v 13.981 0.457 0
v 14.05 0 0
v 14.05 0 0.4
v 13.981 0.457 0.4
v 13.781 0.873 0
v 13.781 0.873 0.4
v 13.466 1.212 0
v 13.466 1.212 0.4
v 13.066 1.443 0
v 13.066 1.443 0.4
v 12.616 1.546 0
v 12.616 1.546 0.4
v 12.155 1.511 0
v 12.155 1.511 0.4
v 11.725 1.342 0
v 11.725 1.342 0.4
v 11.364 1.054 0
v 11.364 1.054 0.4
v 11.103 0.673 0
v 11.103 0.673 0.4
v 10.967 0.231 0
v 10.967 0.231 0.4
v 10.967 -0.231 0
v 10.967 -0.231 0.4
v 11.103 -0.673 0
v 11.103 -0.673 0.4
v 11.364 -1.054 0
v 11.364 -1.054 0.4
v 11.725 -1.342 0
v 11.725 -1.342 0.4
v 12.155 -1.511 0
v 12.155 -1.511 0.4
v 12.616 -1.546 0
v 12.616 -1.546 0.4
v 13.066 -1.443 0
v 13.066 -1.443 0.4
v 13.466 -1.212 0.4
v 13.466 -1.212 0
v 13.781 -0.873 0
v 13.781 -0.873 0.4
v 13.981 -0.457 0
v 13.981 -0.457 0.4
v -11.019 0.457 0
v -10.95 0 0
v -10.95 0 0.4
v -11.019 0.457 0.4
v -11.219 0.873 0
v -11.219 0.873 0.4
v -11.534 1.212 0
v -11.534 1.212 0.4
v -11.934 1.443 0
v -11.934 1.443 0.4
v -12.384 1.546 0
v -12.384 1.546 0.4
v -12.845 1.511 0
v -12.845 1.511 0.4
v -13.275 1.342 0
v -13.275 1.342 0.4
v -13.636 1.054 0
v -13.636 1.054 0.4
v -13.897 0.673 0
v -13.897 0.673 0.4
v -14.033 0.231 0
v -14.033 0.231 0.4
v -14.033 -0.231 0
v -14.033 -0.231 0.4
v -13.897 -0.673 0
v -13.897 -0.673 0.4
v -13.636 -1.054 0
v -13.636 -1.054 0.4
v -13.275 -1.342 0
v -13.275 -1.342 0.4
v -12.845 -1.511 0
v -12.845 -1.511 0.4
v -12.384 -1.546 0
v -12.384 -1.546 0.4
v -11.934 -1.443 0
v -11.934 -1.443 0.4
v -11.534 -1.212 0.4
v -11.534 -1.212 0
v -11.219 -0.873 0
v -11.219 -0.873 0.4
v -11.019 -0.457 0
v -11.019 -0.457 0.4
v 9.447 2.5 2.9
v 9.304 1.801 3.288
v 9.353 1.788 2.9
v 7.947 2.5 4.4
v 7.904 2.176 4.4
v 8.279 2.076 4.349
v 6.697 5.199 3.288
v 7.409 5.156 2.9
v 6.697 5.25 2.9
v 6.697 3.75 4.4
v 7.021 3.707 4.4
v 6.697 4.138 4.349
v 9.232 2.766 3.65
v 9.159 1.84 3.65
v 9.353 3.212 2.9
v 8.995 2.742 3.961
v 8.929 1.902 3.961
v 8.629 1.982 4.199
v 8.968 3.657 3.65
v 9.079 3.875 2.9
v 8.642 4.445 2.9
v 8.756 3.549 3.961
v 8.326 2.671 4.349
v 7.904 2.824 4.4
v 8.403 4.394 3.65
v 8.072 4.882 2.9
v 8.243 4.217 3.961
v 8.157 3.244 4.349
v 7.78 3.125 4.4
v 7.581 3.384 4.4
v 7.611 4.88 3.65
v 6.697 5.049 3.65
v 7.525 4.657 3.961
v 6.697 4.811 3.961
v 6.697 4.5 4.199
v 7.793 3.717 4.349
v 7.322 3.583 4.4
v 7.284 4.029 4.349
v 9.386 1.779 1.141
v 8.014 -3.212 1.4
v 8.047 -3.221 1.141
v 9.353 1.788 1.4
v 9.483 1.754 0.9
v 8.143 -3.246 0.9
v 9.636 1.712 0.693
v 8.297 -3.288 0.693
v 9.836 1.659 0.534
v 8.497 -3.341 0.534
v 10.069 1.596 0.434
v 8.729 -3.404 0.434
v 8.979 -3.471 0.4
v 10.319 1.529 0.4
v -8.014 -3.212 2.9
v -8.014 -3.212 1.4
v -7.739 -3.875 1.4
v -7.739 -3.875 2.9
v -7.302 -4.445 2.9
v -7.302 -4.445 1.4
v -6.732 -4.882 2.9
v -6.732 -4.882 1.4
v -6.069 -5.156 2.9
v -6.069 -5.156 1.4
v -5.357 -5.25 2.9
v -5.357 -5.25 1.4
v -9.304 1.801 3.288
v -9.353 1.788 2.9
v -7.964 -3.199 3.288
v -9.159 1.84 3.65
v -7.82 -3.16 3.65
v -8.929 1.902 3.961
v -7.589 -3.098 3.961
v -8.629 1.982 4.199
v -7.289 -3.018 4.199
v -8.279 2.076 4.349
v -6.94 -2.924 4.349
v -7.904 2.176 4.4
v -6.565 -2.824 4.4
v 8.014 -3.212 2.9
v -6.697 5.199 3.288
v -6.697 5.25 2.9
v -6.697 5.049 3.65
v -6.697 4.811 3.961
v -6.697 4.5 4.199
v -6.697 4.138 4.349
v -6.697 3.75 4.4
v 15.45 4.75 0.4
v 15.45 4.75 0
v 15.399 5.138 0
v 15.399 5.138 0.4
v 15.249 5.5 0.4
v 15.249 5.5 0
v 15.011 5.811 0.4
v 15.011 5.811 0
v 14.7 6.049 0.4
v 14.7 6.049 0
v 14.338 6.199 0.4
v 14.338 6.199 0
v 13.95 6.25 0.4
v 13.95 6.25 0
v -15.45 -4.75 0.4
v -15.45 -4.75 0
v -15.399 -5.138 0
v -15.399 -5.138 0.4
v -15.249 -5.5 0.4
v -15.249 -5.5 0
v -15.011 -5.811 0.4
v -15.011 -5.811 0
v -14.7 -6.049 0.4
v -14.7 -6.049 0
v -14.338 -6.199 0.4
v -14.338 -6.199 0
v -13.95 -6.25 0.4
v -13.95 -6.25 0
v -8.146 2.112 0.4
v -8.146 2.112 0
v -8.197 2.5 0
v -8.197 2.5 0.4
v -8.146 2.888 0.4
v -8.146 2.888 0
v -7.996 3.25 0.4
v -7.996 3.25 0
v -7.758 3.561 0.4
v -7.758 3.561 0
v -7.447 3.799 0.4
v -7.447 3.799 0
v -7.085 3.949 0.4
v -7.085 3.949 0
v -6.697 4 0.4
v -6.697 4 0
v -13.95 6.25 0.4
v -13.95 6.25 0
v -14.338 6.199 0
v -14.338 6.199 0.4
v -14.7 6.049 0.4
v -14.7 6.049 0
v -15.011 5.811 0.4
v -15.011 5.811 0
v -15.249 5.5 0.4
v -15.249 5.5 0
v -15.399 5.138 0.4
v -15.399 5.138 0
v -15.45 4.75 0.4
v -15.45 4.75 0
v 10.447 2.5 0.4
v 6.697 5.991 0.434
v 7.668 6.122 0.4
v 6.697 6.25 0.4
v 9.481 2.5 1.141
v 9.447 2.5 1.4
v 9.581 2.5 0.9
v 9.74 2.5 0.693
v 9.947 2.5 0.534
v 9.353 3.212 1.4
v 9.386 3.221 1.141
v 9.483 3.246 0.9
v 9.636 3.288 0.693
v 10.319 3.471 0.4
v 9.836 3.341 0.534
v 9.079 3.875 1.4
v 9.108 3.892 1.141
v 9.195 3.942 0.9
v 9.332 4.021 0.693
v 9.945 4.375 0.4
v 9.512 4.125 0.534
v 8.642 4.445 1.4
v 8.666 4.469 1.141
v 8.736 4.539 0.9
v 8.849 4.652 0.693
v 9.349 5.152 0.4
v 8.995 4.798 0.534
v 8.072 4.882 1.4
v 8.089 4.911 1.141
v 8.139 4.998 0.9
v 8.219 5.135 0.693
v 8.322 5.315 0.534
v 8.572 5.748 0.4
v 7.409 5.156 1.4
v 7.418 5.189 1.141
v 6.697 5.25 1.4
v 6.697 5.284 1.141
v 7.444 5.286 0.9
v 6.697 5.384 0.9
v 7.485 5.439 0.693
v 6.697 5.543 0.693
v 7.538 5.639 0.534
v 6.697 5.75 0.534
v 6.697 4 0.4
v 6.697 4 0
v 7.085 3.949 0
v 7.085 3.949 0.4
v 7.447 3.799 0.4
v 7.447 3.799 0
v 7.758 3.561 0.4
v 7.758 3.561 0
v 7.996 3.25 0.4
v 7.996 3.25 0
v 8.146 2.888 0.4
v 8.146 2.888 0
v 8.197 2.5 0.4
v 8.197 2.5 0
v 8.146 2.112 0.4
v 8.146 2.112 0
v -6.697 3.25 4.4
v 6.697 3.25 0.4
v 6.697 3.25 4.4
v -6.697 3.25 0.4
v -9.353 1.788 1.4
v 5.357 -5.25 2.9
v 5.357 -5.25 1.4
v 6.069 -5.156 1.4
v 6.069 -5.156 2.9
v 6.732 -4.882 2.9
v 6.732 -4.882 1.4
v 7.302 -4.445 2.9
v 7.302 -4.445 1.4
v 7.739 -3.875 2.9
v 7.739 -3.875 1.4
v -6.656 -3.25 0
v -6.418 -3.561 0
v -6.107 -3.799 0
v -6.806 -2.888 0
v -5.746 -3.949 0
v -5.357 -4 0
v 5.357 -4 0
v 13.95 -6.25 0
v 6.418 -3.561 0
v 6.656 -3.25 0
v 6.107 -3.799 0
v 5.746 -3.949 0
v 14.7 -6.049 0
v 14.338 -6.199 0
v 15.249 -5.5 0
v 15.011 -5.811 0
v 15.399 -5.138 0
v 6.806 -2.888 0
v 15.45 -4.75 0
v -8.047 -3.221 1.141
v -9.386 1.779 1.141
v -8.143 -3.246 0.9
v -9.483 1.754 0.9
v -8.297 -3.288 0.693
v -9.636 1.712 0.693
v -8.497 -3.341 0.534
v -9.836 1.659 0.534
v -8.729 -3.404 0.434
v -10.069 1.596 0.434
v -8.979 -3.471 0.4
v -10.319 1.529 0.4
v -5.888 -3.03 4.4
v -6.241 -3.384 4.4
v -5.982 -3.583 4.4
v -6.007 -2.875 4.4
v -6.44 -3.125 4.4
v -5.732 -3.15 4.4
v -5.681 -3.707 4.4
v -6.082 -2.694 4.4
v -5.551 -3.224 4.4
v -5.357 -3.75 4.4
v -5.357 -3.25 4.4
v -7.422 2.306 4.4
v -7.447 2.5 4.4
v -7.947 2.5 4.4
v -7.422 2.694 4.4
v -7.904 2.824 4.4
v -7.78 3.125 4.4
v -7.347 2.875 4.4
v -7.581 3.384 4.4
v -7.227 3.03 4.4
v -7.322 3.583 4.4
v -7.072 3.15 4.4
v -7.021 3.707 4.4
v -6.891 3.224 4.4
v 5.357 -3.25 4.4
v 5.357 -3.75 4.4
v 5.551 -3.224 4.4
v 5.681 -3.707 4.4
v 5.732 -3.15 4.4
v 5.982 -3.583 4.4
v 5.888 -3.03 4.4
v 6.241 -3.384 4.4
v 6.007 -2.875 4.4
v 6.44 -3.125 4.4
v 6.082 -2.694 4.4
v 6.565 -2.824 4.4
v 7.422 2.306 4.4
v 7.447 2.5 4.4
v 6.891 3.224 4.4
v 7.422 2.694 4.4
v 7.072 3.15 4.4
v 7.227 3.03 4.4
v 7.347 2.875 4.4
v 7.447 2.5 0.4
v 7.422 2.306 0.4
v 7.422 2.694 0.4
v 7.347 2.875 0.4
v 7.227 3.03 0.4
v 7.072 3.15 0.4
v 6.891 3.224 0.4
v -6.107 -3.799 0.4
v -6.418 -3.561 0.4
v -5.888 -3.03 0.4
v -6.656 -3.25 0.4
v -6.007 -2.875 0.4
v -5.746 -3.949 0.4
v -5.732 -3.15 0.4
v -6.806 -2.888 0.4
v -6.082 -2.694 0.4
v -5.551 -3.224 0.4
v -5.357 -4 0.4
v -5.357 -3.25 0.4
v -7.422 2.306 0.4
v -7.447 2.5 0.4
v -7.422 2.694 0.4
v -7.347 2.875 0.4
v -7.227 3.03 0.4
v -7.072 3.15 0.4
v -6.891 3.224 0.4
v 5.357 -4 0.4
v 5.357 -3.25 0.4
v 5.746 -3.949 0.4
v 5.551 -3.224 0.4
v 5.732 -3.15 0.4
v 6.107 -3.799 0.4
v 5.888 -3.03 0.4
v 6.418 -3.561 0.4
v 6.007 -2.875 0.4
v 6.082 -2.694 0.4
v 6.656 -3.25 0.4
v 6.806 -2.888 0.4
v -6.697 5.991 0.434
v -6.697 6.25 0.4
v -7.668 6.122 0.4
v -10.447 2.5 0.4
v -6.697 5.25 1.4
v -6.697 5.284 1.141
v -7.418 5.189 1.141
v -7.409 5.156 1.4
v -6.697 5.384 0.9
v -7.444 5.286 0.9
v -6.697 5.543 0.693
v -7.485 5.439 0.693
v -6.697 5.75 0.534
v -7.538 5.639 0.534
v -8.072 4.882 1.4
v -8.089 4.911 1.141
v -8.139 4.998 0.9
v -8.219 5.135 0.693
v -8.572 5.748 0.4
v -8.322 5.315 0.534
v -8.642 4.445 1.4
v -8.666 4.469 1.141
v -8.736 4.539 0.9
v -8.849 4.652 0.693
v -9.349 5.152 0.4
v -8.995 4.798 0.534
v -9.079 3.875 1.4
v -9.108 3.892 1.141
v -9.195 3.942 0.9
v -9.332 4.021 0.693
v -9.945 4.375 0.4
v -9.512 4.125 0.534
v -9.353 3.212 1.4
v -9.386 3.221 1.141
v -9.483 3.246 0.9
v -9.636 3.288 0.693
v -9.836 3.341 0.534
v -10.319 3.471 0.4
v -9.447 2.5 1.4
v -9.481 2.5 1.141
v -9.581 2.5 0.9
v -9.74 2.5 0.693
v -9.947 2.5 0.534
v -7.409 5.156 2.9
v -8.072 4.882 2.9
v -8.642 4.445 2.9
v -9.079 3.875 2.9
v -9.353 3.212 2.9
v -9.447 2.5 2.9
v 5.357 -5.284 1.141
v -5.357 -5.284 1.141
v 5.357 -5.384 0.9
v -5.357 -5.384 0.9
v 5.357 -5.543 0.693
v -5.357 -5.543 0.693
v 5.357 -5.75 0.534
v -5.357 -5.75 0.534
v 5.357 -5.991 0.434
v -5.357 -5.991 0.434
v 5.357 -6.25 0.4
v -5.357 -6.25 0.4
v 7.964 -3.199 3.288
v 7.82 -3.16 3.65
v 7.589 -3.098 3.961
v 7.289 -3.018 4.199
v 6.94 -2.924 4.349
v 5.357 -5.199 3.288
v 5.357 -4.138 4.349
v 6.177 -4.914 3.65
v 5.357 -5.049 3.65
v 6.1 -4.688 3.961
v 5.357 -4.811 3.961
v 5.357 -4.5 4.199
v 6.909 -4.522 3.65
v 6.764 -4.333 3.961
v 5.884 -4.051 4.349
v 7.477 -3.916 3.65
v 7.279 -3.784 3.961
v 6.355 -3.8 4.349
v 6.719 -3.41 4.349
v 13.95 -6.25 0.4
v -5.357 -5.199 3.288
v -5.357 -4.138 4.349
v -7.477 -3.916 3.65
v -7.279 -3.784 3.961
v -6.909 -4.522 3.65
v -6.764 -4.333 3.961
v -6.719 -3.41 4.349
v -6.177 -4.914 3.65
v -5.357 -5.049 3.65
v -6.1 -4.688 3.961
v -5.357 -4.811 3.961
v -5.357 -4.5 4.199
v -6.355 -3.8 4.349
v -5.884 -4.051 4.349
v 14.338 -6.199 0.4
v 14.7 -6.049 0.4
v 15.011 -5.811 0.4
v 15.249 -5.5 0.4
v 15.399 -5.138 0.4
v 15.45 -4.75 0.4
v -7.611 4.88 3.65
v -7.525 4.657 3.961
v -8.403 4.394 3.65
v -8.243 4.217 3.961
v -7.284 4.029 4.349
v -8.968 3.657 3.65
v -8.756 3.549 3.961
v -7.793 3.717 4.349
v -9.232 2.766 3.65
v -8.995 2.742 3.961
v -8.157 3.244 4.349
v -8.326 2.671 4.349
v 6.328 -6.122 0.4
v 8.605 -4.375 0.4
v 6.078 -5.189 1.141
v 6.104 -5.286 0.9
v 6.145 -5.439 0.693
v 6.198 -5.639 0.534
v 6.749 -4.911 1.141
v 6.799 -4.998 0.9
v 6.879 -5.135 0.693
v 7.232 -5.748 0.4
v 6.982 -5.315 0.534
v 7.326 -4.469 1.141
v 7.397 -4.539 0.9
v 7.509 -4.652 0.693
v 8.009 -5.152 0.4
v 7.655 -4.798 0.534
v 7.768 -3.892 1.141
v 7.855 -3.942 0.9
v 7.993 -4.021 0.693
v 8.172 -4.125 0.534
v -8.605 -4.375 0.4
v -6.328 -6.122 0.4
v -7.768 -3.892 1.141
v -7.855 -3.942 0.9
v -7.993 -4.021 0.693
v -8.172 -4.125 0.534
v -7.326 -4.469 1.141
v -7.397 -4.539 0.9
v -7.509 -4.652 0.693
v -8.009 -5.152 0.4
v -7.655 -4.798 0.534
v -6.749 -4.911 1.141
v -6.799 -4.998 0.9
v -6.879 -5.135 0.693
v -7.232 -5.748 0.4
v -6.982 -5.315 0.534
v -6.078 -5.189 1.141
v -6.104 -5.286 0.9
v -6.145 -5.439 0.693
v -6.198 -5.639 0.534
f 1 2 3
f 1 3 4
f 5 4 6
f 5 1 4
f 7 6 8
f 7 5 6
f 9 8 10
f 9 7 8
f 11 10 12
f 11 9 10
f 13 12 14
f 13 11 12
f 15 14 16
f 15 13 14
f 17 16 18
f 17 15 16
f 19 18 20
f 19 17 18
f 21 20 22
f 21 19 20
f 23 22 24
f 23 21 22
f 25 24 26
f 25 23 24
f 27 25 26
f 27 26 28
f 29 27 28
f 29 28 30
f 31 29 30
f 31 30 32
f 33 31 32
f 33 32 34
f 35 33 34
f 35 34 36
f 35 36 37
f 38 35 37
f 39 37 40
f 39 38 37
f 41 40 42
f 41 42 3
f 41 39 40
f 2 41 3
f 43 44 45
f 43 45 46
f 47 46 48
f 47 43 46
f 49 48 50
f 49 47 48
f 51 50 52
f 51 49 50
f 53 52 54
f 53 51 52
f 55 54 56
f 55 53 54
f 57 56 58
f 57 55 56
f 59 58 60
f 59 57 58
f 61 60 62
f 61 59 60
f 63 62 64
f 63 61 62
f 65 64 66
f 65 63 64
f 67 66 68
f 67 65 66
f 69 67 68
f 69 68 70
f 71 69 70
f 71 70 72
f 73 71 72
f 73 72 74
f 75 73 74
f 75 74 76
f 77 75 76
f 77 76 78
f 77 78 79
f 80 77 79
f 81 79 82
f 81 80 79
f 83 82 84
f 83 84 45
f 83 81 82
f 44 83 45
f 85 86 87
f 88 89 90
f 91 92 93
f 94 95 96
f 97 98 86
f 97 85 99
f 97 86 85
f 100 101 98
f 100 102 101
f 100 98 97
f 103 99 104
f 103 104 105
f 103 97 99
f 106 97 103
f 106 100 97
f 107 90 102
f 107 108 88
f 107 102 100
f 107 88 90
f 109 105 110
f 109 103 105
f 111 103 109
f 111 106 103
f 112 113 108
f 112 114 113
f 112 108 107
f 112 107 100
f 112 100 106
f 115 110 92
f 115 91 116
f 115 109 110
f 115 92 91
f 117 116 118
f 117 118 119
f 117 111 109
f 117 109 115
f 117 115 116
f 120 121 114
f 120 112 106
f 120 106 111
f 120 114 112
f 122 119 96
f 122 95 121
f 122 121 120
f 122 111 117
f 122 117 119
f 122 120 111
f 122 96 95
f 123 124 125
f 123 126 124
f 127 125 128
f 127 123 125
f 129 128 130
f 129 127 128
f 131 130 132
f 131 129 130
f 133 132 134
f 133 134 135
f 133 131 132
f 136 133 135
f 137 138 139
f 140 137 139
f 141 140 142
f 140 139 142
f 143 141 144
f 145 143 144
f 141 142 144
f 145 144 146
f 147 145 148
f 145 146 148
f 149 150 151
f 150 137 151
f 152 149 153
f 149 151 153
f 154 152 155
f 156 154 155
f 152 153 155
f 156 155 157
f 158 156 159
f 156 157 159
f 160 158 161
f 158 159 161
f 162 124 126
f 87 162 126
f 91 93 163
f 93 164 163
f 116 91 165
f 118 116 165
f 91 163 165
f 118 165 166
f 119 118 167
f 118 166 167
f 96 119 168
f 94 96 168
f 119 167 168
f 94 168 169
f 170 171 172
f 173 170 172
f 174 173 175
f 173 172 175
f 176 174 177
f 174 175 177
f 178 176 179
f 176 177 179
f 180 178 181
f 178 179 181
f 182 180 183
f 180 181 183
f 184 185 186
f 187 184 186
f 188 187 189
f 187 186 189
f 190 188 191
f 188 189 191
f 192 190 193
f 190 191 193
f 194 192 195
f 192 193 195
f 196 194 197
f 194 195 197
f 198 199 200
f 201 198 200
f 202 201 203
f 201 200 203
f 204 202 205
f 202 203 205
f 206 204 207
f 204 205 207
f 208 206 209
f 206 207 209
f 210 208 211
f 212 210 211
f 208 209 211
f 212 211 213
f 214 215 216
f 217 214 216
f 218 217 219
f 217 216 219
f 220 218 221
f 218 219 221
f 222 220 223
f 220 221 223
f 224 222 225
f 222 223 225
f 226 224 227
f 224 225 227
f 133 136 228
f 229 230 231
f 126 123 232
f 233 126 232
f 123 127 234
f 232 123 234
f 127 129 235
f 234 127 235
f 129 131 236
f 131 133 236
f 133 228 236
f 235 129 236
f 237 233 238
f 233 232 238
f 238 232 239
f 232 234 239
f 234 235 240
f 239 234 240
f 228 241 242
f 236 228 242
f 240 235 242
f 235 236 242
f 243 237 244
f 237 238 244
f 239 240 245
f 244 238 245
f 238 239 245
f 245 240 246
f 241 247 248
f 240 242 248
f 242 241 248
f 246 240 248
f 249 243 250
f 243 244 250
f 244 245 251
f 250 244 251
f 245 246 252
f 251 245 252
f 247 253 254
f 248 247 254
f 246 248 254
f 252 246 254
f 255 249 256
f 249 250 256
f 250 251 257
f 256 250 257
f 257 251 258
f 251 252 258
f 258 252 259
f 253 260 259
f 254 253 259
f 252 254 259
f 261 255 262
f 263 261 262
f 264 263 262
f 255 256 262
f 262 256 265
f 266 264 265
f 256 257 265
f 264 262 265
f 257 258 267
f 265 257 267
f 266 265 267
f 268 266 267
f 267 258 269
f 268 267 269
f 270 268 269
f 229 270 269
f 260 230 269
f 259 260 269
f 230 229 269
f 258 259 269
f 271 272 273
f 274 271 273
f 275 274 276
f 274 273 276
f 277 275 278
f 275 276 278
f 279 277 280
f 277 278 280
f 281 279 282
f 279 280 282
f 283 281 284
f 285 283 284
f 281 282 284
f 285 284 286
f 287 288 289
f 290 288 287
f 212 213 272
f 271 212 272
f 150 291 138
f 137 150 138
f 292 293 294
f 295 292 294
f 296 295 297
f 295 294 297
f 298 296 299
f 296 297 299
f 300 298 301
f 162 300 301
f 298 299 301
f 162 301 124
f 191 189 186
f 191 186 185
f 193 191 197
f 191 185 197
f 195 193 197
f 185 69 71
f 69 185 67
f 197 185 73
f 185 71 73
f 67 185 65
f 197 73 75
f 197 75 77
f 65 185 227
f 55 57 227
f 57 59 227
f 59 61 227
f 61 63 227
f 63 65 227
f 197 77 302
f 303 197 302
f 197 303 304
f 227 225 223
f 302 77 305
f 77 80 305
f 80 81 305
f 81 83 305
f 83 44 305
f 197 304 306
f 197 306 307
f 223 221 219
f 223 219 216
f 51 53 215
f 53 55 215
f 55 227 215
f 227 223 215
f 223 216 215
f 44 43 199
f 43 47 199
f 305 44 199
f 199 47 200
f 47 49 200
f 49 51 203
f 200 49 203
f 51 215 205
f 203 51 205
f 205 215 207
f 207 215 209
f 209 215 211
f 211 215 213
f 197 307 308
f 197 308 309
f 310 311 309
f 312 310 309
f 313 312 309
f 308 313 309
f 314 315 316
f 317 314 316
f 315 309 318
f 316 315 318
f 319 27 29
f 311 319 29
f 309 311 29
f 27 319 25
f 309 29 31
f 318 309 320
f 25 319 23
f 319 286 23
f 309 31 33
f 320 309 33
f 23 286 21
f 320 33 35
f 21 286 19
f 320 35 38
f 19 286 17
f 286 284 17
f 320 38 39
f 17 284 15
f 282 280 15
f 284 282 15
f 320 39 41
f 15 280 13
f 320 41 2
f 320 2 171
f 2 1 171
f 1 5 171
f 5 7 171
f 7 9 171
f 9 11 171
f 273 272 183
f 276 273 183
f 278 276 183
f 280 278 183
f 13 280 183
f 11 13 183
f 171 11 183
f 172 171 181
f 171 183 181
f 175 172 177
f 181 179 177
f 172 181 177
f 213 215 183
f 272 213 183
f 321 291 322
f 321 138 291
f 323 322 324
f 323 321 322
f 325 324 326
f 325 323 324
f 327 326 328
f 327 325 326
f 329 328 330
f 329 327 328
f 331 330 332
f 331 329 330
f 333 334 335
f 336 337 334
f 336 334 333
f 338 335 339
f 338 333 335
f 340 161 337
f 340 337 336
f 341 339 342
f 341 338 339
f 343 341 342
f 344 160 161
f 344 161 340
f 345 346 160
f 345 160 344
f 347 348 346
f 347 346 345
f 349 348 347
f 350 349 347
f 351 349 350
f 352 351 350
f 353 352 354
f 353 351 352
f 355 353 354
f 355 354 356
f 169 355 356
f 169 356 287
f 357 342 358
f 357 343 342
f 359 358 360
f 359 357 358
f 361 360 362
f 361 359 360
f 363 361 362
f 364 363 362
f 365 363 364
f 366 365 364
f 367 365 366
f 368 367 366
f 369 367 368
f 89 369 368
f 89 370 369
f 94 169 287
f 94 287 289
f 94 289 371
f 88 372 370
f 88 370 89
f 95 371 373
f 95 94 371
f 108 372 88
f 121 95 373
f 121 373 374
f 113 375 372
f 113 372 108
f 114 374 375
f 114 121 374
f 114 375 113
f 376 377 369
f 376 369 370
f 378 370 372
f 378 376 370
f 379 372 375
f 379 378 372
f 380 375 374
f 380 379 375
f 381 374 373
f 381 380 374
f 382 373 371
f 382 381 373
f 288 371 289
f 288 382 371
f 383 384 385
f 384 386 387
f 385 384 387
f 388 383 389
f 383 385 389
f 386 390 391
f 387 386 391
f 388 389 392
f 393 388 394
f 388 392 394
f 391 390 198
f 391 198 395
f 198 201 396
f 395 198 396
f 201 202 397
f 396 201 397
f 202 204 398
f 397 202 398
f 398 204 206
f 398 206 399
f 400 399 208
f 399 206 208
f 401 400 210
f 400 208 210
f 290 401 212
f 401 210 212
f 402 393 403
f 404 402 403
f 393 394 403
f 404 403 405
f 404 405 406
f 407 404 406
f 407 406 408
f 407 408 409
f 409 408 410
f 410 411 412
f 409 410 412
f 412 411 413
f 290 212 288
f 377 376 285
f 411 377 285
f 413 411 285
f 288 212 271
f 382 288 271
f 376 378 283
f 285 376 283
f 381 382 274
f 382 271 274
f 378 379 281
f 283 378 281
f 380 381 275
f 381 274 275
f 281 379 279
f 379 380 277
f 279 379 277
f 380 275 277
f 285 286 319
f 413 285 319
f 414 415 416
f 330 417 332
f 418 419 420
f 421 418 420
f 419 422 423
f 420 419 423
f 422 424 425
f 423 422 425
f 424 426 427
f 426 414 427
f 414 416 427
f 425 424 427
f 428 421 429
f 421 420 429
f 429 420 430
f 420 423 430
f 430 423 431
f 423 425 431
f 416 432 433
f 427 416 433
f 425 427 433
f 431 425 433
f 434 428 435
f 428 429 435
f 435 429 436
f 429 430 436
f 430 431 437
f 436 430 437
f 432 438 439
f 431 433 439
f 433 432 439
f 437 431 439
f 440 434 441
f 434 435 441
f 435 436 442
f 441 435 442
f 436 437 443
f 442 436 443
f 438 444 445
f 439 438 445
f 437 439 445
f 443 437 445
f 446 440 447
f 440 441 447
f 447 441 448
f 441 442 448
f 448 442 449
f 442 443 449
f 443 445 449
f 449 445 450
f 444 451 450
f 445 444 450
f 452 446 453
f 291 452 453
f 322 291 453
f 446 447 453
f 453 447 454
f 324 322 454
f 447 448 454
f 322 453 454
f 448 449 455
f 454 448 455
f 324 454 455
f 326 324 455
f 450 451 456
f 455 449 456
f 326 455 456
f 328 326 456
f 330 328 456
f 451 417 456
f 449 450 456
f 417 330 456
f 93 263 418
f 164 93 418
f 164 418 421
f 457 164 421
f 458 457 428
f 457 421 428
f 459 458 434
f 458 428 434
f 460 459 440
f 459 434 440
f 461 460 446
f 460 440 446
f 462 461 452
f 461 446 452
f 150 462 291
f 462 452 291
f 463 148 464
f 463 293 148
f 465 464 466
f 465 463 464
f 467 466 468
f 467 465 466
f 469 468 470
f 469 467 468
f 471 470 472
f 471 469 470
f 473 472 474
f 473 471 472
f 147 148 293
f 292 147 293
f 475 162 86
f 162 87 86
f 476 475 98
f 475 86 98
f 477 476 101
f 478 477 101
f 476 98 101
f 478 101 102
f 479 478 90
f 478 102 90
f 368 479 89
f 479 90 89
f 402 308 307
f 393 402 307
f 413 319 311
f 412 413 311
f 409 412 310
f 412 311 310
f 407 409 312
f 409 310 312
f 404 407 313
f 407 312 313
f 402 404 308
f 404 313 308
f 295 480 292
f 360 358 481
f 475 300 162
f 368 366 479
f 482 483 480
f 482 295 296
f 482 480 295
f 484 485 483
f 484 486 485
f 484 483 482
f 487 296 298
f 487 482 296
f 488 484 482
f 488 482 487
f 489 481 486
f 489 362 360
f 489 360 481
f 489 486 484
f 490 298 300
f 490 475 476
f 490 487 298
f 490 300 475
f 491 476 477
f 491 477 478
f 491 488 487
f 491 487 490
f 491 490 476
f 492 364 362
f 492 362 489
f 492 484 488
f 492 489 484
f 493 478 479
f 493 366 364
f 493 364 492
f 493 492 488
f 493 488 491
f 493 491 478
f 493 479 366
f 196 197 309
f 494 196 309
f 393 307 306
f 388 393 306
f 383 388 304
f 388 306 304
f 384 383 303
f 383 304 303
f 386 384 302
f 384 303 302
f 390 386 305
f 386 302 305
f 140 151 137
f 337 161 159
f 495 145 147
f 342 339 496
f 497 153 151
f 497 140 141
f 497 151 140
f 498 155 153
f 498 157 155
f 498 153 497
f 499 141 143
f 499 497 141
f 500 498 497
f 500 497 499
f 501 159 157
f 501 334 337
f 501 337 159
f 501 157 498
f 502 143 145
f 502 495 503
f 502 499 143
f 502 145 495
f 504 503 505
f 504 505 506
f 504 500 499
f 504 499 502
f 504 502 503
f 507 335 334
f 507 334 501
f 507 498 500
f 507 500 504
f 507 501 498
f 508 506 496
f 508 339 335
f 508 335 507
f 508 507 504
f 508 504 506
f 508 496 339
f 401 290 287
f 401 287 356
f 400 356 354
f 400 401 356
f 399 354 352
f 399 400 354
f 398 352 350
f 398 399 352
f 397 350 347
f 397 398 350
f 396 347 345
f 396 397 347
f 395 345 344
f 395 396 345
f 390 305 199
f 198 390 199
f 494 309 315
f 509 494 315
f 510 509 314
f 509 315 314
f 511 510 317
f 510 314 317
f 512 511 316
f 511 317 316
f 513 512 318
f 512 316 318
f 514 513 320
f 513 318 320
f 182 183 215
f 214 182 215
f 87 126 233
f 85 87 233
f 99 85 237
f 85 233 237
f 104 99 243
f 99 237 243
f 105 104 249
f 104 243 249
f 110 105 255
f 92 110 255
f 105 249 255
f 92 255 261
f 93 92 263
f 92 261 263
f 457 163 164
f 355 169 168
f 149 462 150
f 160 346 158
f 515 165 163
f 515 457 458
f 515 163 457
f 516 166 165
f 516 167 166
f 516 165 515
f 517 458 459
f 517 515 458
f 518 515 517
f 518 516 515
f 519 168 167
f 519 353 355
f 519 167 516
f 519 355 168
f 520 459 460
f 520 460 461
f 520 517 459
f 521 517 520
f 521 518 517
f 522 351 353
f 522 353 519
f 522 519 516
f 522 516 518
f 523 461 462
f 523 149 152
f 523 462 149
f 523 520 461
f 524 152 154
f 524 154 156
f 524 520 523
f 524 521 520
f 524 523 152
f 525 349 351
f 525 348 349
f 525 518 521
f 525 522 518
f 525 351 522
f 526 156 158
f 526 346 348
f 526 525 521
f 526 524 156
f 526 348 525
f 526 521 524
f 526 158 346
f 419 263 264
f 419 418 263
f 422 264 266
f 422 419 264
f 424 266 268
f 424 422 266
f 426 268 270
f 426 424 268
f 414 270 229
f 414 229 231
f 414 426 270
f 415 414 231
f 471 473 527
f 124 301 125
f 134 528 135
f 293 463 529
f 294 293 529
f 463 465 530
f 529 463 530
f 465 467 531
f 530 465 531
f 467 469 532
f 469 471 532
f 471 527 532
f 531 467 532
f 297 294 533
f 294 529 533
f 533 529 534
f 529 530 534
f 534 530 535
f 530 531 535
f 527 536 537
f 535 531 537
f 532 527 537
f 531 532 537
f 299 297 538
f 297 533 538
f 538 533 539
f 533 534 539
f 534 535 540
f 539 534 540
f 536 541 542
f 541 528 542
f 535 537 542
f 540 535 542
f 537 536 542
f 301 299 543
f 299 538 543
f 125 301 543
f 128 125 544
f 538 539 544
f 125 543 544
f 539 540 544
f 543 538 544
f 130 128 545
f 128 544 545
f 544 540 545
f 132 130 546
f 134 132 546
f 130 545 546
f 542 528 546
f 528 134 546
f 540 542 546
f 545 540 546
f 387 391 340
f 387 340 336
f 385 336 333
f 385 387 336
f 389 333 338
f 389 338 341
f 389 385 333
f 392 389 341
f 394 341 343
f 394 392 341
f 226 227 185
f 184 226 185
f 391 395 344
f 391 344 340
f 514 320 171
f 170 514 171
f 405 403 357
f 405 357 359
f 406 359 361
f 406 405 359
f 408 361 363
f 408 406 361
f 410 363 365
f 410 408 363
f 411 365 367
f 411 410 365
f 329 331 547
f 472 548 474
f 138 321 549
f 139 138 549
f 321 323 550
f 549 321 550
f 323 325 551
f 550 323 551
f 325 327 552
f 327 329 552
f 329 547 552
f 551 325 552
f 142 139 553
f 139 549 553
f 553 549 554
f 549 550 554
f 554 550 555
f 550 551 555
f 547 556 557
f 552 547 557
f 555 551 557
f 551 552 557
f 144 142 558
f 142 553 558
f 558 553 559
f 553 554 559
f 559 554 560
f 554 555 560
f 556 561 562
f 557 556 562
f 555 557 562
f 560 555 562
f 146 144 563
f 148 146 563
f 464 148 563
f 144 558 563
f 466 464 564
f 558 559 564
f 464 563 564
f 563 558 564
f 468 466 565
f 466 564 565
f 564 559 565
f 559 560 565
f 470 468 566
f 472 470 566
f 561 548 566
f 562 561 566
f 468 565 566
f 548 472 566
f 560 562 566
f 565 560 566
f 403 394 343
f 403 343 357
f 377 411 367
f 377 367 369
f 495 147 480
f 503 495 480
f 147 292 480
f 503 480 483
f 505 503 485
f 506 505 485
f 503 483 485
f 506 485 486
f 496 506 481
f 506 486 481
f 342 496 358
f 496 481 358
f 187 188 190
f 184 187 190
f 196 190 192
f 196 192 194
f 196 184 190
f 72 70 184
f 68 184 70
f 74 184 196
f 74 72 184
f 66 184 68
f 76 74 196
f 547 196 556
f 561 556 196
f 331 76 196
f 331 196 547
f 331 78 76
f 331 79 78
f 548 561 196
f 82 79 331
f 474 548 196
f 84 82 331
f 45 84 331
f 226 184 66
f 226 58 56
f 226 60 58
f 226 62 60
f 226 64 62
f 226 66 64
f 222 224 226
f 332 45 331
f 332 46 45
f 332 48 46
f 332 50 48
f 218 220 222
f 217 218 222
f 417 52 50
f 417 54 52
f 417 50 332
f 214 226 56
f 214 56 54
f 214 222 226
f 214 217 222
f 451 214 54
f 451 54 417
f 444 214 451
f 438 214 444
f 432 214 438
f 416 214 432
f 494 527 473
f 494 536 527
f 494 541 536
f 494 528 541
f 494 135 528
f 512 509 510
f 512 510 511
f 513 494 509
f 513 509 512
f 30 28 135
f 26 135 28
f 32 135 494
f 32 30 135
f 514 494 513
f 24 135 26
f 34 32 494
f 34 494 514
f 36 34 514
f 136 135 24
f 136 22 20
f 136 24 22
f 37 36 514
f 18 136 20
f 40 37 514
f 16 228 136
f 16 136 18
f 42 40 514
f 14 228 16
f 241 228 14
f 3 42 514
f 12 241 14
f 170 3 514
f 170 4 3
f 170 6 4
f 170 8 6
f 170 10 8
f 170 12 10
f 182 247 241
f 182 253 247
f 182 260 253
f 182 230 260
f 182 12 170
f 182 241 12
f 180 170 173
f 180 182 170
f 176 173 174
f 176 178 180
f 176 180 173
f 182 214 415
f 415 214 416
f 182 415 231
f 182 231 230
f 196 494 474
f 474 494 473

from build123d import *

# Parameters (mm, degrees)
SKETCH1_R           = 1.55
BOSS_EXTRUDE1_DEPTH = 0.4
BOSS_EXTRUDE2_DEPTH = 4
FILLET1_R           = 1
FILLET2_R           = 1.5


with BuildPart() as part:
    # Sketch1 → Boss-Extrude1 (new body)
    with BuildSketch(Plane.XY):
        with BuildLine():
            Line((13.95, 6.25), (-13.95, 6.25))
            ThreePointArc((-13.95, 6.25), (-15.010660172, 5.810660172), (-15.45, 4.75))
            Line((-15.45, 4.75), (-15.45, -4.75))
            ThreePointArc((-15.45, -4.75), (-15.010660172, -5.810660172), (-13.95, -6.25))
            Line((-13.95, -6.25), (13.95, -6.25))
            ThreePointArc((13.95, -6.25), (15.010660172, -5.810660172), (15.45, -4.75))
            Line((15.45, -4.75), (15.45, 4.75))
            ThreePointArc((15.45, 4.75), (15.010660172, 5.810660172), (13.95, 6.25))
        make_face()
        with Locations((-12.5, 0)):
            Circle(SKETCH1_R, mode=Mode.SUBTRACT)
        with BuildLine():
            Line((-6.806228507, -2.888228568), (-8.145974469, 2.111771432))
            ThreePointArc((-8.145974469, 2.111771432), (-7.88711574, 3.413142144), (-6.697085729, 4))
            Line((-6.697085729, 4), (6.697085729, 4))
            ThreePointArc((6.697085729, 4), (7.88711574, 3.413142144), (8.145974469, 2.111771432))
            Line((8.145974469, 2.111771432), (6.806228507, -2.888228568))
            ThreePointArc((6.806228507, -2.888228568), (6.270481911, -3.69003001), (5.357339767, -4))
            Line((5.357339767, -4), (-5.357339767, -4))
            ThreePointArc((-5.357339767, -4), (-6.270481911, -3.69003001), (-6.806228507, -2.888228568))
        make_face(mode=Mode.SUBTRACT)
        with Locations((12.5, 0)):
            Circle(SKETCH1_R, mode=Mode.SUBTRACT)
    extrude(amount=BOSS_EXTRUDE1_DEPTH)

    # Sketch2 → Boss-Extrude2 (add)
    with BuildSketch(Plane.XY.offset(0.4)):
        with BuildLine():
            Line((-9.353381752, 1.788247626), (-8.01363579, -3.211752374))
            ThreePointArc((-8.01363579, -3.211752374), (-7.031433697, -4.681721686), (-5.357339767, -5.25))
            Line((-5.357339767, -5.25), (5.357339767, -5.25))
            ThreePointArc((5.357339767, -5.25), (7.031433697, -4.681721686), (8.01363579, -3.211752374))
            Line((8.01363579, -3.211752374), (9.353381752, 1.788247626))
            ThreePointArc((9.353381752, 1.788247626), (8.878807415, 4.17409393), (6.697085729, 5.25))
            Line((6.697085729, 5.25), (-6.697085729, 5.25))
            ThreePointArc((-6.697085729, 5.25), (-8.878807415, 4.17409393), (-9.353381752, 1.788247626))
        make_face()
        with BuildLine():
            Line((-5.357339767, -3.25), (5.357339767, -3.25))
            ThreePointArc((5.357339767, -3.25), (5.813910839, -3.095015005), (6.081784137, -2.694114284))
            Line((6.081784137, -2.694114284), (7.421530099, 2.305885716))
            ThreePointArc((7.421530099, 2.305885716), (7.292100735, 2.956571072), (6.697085729, 3.25))
            Line((6.697085729, 3.25), (-6.697085729, 3.25))
            ThreePointArc((-6.697085729, 3.25), (-7.292100735, 2.956571072), (-7.421530099, 2.305885716))
            Line((-7.421530099, 2.305885716), (-6.081784137, -2.694114284))
            ThreePointArc((-6.081784137, -2.694114284), (-5.813910839, -3.095015005), (-5.357339767, -3.25))
        make_face(mode=Mode.SUBTRACT)
    extrude(amount=BOSS_EXTRUDE2_DEPTH)

    # Fillet1
    fillet1_edges = [part.edges().sort_by_distance(p)[0] for p in [
        (-8.878807415, 4.17409393, 0.4),
        (-8.683508771, -0.711752374, 0.4),
        (-7.031433697, -4.681721686, 0.4),
        (0, -5.25, 0.4),
        (7.031433697, -4.681721686, 0.4),
        (8.683508771, -0.711752374, 0.4),
        (8.878807415, 4.17409393, 0.4),
        (0, 5.25, 0.4),
    ]]
    fillet(fillet1_edges, radius=FILLET1_R - 0.0001)  # a hair under: the kernel refuses the full size

    # Fillet2
    fillet2_edges = [part.edges().sort_by_distance(p)[0] for p in [
        (-8.878807415, 4.17409393, 4.4),
        (-8.683508771, -0.711752374, 4.4),
        (-7.031433697, -4.681721686, 4.4),
        (0, -5.25, 4.4),
        (7.031433697, -4.681721686, 4.4),
        (8.683508771, -0.711752374, 4.4),
        (8.878807415, 4.17409393, 4.4),
        (0, 5.25, 4.4),
    ]]
    fillet(fillet2_edges, radius=FILLET2_R)


solid = part.part
